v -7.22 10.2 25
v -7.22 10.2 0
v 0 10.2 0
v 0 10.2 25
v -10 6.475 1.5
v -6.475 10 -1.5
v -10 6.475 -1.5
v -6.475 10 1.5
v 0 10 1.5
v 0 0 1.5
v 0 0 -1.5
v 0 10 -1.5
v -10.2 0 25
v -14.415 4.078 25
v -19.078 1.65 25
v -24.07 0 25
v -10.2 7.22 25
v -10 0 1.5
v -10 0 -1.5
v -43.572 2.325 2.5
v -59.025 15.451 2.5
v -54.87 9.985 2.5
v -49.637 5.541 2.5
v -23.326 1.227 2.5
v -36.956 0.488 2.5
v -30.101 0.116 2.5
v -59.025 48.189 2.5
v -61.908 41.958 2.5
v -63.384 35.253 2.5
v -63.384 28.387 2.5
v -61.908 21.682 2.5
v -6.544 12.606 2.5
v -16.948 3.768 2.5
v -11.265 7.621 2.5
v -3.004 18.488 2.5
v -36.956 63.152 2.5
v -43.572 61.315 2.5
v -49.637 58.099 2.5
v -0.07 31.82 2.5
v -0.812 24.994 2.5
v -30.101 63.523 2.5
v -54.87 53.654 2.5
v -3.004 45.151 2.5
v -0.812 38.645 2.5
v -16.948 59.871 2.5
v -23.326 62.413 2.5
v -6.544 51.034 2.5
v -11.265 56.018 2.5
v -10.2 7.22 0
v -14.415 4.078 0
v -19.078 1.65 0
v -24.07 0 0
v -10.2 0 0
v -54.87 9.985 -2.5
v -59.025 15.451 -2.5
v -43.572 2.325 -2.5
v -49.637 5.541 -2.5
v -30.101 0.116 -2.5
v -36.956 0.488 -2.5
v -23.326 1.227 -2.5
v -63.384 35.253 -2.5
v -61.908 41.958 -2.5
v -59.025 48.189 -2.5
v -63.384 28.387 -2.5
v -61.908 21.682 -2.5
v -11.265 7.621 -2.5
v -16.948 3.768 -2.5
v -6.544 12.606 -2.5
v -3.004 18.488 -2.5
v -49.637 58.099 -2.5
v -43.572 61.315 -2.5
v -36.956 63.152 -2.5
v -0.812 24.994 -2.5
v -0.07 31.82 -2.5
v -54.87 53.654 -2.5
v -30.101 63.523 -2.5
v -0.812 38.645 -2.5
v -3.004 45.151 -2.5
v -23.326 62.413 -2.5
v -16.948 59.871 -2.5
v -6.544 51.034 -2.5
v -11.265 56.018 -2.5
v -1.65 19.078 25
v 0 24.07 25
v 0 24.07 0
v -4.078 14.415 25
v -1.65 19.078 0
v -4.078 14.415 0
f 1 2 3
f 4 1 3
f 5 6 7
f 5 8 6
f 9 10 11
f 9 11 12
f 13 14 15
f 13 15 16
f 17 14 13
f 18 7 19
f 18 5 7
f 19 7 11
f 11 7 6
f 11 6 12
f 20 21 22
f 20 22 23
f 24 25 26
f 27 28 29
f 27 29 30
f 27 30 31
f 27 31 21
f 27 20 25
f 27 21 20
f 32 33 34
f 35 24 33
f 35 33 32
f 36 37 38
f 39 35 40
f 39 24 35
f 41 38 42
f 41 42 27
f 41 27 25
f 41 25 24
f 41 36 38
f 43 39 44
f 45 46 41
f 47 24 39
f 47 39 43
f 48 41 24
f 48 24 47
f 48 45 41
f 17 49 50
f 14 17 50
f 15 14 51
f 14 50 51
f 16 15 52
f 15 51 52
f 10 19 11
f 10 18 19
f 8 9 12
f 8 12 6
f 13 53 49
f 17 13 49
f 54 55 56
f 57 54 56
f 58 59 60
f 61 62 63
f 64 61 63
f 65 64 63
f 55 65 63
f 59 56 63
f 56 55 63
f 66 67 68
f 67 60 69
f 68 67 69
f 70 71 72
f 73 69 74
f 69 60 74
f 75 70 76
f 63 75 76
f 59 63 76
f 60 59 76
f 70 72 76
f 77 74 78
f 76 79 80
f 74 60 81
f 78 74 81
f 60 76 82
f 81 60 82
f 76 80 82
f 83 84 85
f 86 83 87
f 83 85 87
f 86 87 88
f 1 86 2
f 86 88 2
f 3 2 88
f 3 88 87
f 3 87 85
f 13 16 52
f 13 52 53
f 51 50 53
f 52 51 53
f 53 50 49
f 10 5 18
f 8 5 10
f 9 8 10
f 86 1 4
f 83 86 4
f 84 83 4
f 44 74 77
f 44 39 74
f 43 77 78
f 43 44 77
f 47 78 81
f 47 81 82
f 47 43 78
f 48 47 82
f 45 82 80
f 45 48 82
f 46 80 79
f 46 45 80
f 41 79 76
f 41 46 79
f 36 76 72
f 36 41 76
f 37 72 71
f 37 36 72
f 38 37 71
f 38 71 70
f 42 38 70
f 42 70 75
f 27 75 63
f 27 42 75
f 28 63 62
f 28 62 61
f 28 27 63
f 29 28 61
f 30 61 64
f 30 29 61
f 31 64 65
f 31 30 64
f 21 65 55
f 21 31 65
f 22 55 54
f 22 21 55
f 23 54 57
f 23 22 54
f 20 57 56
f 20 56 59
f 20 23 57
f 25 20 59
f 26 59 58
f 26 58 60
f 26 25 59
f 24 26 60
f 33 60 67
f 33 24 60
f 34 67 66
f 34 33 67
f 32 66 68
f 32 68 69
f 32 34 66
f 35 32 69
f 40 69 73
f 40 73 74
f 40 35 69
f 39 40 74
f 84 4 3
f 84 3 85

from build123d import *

# Parameters (mm, degrees)
F0_R     = 31.75
F1_DEPTH = 2.5
F3_DEPTH = 1.5
F4_DEPTH = 25


with BuildPart() as f1:
    # F0 (on Top) → F1 (new body, symmetric)
    with BuildSketch(Plane.XY):
        with Locations((-31.8198051534, 31.8198051534)):
            Circle(F0_R)
    extrude(amount=F1_DEPTH, both=True)


with BuildPart() as f3:
    # F2 (on Top) → F3 (new body, symmetric)
    with BuildSketch(Plane.XY):
        Polygon((-10, 0), (0, 0), (0, 10), (-6.475, 10), (-10, 6.475), align=None)
    extrude(amount=F3_DEPTH, both=True)


with BuildPart() as f4:
    # F2 (on Top) → F4 (new body)
    with BuildSketch(Plane.XY):
        with BuildLine():
            ThreePointArc((-10.2000003681, 7.2200741987), (-16.6976711615, 2.770127263), (-24.0697908307, 0))
            Line((-24.0697908307, 0), (-10.2000003681, 0))
            Line((-10.2000003681, 0), (-10.2000003681, 7.2200741987))
        make_face()
    extrude(amount=F4_DEPTH)


with BuildPart() as f4b:
    # F2 (on Top) → F4, piece 2 (new body)
    with BuildSketch(Plane.XY):
        with BuildLine():
            Line((-7.2200741987, 10.2000003681), (0, 10.2000003681))
            Line((0, 10.2000003681), (0, 24.0697908307))
            ThreePointArc((0, 24.0697908307), (-2.770127263, 16.6976711615), (-7.2200741987, 10.2000003681))
        make_face()
    extrude(amount=F4_DEPTH)


solid = Compound([f1.part, f3.part, f4.part, f4b.part])
